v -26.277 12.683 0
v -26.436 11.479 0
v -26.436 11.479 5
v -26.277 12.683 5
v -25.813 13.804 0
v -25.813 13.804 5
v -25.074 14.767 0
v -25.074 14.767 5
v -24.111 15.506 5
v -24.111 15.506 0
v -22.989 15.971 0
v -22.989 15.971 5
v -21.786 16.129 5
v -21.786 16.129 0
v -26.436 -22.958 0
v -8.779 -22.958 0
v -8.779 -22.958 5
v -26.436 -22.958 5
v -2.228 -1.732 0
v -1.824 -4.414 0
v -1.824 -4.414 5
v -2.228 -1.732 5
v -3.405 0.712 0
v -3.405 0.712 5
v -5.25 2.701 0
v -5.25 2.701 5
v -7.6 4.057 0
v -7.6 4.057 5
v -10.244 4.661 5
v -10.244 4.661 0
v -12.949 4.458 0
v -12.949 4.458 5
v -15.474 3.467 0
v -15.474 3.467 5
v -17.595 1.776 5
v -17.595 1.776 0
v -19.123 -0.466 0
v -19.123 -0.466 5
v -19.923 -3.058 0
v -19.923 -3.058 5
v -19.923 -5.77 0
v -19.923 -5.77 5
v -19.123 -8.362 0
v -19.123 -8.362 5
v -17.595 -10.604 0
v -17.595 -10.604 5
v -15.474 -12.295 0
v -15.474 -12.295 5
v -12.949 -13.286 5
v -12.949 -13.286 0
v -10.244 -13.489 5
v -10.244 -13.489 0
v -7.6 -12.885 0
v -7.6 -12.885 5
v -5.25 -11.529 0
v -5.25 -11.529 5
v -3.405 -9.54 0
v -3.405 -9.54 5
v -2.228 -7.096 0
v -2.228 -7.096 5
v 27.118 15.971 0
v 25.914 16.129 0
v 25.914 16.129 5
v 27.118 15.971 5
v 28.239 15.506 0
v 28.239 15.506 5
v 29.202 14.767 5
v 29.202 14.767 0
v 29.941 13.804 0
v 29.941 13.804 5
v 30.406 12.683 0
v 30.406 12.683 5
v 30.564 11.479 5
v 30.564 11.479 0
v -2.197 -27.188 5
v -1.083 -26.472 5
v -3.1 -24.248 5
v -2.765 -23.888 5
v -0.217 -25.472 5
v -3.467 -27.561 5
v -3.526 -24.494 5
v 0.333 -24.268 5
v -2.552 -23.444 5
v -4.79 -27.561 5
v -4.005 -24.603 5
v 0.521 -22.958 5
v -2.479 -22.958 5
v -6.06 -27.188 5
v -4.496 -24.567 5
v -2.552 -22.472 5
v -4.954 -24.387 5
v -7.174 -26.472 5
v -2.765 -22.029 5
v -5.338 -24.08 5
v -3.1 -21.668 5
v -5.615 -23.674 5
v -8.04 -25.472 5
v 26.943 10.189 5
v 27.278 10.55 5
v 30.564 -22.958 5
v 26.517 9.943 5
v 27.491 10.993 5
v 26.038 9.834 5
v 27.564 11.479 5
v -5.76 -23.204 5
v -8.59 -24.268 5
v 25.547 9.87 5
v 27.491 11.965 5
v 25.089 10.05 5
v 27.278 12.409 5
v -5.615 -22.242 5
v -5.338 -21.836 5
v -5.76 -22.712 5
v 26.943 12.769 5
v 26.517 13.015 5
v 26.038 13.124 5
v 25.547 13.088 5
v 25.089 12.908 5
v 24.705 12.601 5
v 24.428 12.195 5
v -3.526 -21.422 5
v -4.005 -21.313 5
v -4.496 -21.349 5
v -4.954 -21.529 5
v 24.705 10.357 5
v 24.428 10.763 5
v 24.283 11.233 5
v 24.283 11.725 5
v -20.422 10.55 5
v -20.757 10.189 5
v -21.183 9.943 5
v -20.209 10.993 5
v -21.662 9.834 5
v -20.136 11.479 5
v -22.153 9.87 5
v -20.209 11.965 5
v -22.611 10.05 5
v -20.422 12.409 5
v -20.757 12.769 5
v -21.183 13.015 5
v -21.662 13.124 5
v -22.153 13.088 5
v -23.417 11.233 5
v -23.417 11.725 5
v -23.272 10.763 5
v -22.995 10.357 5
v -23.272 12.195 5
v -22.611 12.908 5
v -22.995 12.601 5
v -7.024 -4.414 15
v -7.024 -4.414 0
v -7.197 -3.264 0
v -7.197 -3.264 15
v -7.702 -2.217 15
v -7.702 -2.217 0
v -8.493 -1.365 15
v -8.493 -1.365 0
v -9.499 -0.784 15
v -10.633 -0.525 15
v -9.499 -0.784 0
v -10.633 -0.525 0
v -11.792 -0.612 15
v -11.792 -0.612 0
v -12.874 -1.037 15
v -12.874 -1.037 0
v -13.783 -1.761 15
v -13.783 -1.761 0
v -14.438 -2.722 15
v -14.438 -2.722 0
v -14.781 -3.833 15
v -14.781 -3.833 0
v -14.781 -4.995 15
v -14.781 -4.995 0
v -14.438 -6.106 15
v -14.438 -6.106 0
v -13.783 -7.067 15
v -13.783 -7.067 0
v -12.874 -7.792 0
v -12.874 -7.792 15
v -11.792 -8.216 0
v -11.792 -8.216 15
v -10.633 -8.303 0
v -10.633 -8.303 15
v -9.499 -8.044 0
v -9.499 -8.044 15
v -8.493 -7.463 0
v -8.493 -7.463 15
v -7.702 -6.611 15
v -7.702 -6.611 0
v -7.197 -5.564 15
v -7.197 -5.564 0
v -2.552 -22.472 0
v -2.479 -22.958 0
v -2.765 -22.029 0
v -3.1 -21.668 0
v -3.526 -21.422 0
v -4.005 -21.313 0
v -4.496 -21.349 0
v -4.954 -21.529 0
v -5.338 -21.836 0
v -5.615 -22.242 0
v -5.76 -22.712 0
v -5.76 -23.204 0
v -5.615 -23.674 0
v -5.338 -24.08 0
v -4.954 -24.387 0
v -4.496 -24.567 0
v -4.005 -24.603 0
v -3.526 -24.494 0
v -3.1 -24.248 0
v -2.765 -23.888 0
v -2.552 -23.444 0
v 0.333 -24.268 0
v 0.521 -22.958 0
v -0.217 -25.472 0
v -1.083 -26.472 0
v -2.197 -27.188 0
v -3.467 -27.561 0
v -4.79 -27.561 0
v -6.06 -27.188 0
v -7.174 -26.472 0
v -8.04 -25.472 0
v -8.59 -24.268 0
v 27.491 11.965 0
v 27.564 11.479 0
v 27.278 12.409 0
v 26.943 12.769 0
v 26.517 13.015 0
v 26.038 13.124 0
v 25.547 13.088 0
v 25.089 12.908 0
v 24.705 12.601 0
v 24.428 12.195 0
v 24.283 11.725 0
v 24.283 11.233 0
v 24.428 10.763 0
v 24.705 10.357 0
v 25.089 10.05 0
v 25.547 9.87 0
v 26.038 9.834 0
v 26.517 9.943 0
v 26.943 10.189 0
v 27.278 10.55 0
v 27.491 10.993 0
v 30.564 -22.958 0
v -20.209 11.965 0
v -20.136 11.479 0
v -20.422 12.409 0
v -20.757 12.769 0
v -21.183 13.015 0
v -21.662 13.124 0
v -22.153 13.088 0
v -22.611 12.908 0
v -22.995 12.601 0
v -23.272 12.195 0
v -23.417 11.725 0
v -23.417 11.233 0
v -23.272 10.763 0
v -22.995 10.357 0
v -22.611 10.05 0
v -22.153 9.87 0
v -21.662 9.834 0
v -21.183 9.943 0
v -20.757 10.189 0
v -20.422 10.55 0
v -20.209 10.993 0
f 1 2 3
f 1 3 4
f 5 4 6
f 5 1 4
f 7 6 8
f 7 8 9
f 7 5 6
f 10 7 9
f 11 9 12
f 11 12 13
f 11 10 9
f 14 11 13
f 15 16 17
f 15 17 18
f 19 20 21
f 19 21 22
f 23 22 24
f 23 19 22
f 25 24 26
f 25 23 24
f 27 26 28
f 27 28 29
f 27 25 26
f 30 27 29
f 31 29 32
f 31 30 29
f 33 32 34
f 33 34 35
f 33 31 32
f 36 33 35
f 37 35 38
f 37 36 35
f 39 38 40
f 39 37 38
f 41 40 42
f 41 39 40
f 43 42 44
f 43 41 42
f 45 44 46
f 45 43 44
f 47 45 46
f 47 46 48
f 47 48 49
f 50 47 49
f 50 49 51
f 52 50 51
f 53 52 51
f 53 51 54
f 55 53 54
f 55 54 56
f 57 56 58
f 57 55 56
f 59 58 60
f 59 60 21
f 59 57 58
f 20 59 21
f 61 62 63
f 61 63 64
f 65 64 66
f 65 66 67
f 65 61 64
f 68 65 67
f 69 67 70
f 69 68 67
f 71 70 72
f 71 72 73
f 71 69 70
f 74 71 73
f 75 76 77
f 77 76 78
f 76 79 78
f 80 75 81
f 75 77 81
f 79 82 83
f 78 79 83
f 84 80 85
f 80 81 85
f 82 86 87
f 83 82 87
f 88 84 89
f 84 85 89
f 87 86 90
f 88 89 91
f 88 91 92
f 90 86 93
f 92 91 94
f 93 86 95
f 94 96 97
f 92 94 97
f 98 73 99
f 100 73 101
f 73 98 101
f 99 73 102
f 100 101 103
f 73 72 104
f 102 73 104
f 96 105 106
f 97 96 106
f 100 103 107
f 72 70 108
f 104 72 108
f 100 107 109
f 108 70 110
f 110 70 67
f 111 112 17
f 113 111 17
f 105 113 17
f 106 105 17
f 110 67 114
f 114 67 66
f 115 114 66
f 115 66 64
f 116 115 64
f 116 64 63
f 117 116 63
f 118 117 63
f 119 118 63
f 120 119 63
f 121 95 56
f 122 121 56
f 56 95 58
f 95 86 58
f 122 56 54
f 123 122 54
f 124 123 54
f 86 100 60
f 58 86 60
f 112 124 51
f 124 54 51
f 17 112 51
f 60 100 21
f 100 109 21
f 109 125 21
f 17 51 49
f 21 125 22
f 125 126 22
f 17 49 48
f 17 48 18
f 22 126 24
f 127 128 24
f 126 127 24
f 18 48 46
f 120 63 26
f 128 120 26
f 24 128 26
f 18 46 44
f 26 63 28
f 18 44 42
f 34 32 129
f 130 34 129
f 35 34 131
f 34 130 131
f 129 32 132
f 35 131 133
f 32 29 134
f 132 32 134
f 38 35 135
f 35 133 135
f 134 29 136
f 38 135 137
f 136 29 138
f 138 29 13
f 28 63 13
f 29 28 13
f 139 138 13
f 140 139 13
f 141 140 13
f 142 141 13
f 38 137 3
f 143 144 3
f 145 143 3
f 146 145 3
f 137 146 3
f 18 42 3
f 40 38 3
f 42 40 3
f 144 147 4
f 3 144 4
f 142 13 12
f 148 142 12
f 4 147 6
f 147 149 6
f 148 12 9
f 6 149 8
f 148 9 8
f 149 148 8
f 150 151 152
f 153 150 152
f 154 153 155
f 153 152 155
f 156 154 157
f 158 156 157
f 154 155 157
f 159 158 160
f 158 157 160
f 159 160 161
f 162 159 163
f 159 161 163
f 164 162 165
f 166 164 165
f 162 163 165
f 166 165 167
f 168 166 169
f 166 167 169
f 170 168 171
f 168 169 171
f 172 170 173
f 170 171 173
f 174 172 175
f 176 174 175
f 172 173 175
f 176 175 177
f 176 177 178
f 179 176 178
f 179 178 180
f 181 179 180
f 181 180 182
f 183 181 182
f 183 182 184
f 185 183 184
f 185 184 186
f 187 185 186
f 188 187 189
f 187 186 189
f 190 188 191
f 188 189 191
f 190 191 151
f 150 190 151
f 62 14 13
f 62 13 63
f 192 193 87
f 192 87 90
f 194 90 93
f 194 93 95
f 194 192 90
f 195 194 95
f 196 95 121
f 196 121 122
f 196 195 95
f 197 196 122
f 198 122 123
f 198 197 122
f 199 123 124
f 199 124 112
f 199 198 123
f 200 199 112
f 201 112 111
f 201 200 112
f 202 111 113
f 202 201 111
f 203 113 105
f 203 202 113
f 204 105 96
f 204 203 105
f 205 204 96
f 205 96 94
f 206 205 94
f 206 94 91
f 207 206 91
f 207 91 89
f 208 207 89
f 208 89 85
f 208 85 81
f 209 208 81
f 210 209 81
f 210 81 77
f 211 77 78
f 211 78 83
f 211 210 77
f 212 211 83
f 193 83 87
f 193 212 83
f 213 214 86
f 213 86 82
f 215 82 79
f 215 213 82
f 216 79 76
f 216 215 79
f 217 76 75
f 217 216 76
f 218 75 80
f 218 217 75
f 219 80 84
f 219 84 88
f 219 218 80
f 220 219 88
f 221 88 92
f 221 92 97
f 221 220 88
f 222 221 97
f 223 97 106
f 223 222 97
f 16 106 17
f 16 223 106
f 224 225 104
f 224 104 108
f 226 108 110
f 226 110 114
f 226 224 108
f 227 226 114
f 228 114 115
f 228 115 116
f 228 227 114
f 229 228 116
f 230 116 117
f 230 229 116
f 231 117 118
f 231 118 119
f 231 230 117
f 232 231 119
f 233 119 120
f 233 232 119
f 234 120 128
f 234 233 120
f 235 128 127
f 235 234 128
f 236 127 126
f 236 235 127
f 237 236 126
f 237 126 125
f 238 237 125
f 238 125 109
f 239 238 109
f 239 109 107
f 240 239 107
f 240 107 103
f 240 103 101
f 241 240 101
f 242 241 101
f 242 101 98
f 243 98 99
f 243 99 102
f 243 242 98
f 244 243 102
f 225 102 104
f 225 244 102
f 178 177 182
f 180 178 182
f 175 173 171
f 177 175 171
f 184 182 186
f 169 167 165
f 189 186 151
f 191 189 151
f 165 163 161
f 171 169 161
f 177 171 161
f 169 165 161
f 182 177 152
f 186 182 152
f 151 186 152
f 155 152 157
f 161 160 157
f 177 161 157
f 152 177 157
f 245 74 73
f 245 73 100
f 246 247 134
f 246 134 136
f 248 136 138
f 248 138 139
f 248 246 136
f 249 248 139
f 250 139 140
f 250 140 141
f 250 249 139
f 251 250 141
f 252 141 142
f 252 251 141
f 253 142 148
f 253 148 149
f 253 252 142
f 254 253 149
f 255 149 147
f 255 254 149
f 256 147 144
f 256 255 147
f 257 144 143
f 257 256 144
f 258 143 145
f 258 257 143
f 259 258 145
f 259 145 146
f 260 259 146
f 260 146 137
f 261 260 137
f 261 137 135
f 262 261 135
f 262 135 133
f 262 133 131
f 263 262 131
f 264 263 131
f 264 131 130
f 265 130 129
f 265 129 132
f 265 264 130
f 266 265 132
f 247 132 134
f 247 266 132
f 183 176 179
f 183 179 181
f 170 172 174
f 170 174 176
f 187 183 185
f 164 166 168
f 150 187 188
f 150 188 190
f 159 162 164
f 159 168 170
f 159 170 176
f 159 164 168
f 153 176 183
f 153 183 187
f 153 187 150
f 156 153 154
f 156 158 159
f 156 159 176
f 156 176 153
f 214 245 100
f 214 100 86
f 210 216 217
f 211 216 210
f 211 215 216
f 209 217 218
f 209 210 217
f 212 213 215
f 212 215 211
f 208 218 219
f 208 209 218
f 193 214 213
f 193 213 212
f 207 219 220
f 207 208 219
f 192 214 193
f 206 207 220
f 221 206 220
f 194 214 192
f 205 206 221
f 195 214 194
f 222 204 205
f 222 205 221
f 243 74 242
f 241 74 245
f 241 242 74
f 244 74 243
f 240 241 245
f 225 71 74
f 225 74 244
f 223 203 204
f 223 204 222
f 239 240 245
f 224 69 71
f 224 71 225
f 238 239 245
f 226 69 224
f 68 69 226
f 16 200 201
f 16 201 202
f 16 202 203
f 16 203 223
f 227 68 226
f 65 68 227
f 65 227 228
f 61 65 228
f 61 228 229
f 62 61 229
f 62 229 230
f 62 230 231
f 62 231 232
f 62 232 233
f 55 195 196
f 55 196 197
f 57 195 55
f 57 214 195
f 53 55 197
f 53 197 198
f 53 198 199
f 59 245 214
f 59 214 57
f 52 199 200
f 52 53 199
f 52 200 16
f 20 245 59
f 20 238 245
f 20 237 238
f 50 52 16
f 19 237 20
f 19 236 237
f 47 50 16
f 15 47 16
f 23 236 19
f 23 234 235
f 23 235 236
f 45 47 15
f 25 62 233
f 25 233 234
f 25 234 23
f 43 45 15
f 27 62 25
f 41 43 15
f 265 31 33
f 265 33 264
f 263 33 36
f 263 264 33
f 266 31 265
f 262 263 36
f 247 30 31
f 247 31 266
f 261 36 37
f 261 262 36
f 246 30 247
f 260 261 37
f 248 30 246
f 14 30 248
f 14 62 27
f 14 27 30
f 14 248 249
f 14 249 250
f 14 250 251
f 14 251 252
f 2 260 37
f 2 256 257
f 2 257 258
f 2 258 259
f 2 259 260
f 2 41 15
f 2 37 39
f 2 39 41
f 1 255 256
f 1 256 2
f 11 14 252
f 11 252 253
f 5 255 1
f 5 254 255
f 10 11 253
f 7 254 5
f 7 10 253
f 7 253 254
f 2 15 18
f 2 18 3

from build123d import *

# Parameters (mm, degrees)
SKETCH2_R           = 1.65
SKETCH2_R_2         = 9.1
BOSS_EXTRUDE2_DEPTH = 5
SKETCH2_4_R         = 3.9
BOSS_EXTRUDE3_DEPTH = 15


with BuildPart() as part:
    # Sketch2 → Boss-Extrude2 (new body)
    with BuildSketch(Plane.XY):
        with BuildLine():
            ThreePointArc((-21.785709294, 16.129042909), (-25.073755827, 14.767089441), (-26.435709294, 11.479042909))
            Line((-26.435709294, 11.479042909), (-26.435709294, -22.958085818))
            Line((-26.435709294, -22.958085818), (-8.778581412, -22.958085818))
            ThreePointArc((-8.778581412, -22.958085818), (-4.128581412, -27.608085818), (0.521418588, -22.958085818))
            Line((0.521418588, -22.958085818), (30.564290706, -22.958085818))
            Line((30.564290706, -22.958085818), (30.564290706, 3.208952553))
            Line((30.564290706, 3.208952553), (30.564290706, 11.479042909))
            ThreePointArc((30.564290706, 11.479042909), (29.202337238, 14.767089441), (25.914290706, 16.129042909))
            Line((25.914290706, 16.129042909), (-21.785709294, 16.129042909))
        make_face()
        with Locations((-4.128581412, -22.958085818)):
            Circle(SKETCH2_R, mode=Mode.SUBTRACT)
        with Locations((-10.924160063, -4.414013698)):
            Circle(SKETCH2_R_2, mode=Mode.SUBTRACT)
        with Locations((-21.785709294, 11.479042909)):
            Circle(SKETCH2_R, mode=Mode.SUBTRACT)
        with Locations((25.914290706, 11.479042909)):
            Circle(SKETCH2_R, mode=Mode.SUBTRACT)
    extrude(amount=BOSS_EXTRUDE2_DEPTH)


with BuildPart() as body_2:
    # Sketch2<4> → Boss-Extrude3 (new body)
    with BuildSketch(Plane.XY):
        with Locations((-10.924160063, -4.414013698)):
            Circle(SKETCH2_4_R)
    extrude(amount=BOSS_EXTRUDE3_DEPTH)


solid = Compound([part.part, body_2.part])
